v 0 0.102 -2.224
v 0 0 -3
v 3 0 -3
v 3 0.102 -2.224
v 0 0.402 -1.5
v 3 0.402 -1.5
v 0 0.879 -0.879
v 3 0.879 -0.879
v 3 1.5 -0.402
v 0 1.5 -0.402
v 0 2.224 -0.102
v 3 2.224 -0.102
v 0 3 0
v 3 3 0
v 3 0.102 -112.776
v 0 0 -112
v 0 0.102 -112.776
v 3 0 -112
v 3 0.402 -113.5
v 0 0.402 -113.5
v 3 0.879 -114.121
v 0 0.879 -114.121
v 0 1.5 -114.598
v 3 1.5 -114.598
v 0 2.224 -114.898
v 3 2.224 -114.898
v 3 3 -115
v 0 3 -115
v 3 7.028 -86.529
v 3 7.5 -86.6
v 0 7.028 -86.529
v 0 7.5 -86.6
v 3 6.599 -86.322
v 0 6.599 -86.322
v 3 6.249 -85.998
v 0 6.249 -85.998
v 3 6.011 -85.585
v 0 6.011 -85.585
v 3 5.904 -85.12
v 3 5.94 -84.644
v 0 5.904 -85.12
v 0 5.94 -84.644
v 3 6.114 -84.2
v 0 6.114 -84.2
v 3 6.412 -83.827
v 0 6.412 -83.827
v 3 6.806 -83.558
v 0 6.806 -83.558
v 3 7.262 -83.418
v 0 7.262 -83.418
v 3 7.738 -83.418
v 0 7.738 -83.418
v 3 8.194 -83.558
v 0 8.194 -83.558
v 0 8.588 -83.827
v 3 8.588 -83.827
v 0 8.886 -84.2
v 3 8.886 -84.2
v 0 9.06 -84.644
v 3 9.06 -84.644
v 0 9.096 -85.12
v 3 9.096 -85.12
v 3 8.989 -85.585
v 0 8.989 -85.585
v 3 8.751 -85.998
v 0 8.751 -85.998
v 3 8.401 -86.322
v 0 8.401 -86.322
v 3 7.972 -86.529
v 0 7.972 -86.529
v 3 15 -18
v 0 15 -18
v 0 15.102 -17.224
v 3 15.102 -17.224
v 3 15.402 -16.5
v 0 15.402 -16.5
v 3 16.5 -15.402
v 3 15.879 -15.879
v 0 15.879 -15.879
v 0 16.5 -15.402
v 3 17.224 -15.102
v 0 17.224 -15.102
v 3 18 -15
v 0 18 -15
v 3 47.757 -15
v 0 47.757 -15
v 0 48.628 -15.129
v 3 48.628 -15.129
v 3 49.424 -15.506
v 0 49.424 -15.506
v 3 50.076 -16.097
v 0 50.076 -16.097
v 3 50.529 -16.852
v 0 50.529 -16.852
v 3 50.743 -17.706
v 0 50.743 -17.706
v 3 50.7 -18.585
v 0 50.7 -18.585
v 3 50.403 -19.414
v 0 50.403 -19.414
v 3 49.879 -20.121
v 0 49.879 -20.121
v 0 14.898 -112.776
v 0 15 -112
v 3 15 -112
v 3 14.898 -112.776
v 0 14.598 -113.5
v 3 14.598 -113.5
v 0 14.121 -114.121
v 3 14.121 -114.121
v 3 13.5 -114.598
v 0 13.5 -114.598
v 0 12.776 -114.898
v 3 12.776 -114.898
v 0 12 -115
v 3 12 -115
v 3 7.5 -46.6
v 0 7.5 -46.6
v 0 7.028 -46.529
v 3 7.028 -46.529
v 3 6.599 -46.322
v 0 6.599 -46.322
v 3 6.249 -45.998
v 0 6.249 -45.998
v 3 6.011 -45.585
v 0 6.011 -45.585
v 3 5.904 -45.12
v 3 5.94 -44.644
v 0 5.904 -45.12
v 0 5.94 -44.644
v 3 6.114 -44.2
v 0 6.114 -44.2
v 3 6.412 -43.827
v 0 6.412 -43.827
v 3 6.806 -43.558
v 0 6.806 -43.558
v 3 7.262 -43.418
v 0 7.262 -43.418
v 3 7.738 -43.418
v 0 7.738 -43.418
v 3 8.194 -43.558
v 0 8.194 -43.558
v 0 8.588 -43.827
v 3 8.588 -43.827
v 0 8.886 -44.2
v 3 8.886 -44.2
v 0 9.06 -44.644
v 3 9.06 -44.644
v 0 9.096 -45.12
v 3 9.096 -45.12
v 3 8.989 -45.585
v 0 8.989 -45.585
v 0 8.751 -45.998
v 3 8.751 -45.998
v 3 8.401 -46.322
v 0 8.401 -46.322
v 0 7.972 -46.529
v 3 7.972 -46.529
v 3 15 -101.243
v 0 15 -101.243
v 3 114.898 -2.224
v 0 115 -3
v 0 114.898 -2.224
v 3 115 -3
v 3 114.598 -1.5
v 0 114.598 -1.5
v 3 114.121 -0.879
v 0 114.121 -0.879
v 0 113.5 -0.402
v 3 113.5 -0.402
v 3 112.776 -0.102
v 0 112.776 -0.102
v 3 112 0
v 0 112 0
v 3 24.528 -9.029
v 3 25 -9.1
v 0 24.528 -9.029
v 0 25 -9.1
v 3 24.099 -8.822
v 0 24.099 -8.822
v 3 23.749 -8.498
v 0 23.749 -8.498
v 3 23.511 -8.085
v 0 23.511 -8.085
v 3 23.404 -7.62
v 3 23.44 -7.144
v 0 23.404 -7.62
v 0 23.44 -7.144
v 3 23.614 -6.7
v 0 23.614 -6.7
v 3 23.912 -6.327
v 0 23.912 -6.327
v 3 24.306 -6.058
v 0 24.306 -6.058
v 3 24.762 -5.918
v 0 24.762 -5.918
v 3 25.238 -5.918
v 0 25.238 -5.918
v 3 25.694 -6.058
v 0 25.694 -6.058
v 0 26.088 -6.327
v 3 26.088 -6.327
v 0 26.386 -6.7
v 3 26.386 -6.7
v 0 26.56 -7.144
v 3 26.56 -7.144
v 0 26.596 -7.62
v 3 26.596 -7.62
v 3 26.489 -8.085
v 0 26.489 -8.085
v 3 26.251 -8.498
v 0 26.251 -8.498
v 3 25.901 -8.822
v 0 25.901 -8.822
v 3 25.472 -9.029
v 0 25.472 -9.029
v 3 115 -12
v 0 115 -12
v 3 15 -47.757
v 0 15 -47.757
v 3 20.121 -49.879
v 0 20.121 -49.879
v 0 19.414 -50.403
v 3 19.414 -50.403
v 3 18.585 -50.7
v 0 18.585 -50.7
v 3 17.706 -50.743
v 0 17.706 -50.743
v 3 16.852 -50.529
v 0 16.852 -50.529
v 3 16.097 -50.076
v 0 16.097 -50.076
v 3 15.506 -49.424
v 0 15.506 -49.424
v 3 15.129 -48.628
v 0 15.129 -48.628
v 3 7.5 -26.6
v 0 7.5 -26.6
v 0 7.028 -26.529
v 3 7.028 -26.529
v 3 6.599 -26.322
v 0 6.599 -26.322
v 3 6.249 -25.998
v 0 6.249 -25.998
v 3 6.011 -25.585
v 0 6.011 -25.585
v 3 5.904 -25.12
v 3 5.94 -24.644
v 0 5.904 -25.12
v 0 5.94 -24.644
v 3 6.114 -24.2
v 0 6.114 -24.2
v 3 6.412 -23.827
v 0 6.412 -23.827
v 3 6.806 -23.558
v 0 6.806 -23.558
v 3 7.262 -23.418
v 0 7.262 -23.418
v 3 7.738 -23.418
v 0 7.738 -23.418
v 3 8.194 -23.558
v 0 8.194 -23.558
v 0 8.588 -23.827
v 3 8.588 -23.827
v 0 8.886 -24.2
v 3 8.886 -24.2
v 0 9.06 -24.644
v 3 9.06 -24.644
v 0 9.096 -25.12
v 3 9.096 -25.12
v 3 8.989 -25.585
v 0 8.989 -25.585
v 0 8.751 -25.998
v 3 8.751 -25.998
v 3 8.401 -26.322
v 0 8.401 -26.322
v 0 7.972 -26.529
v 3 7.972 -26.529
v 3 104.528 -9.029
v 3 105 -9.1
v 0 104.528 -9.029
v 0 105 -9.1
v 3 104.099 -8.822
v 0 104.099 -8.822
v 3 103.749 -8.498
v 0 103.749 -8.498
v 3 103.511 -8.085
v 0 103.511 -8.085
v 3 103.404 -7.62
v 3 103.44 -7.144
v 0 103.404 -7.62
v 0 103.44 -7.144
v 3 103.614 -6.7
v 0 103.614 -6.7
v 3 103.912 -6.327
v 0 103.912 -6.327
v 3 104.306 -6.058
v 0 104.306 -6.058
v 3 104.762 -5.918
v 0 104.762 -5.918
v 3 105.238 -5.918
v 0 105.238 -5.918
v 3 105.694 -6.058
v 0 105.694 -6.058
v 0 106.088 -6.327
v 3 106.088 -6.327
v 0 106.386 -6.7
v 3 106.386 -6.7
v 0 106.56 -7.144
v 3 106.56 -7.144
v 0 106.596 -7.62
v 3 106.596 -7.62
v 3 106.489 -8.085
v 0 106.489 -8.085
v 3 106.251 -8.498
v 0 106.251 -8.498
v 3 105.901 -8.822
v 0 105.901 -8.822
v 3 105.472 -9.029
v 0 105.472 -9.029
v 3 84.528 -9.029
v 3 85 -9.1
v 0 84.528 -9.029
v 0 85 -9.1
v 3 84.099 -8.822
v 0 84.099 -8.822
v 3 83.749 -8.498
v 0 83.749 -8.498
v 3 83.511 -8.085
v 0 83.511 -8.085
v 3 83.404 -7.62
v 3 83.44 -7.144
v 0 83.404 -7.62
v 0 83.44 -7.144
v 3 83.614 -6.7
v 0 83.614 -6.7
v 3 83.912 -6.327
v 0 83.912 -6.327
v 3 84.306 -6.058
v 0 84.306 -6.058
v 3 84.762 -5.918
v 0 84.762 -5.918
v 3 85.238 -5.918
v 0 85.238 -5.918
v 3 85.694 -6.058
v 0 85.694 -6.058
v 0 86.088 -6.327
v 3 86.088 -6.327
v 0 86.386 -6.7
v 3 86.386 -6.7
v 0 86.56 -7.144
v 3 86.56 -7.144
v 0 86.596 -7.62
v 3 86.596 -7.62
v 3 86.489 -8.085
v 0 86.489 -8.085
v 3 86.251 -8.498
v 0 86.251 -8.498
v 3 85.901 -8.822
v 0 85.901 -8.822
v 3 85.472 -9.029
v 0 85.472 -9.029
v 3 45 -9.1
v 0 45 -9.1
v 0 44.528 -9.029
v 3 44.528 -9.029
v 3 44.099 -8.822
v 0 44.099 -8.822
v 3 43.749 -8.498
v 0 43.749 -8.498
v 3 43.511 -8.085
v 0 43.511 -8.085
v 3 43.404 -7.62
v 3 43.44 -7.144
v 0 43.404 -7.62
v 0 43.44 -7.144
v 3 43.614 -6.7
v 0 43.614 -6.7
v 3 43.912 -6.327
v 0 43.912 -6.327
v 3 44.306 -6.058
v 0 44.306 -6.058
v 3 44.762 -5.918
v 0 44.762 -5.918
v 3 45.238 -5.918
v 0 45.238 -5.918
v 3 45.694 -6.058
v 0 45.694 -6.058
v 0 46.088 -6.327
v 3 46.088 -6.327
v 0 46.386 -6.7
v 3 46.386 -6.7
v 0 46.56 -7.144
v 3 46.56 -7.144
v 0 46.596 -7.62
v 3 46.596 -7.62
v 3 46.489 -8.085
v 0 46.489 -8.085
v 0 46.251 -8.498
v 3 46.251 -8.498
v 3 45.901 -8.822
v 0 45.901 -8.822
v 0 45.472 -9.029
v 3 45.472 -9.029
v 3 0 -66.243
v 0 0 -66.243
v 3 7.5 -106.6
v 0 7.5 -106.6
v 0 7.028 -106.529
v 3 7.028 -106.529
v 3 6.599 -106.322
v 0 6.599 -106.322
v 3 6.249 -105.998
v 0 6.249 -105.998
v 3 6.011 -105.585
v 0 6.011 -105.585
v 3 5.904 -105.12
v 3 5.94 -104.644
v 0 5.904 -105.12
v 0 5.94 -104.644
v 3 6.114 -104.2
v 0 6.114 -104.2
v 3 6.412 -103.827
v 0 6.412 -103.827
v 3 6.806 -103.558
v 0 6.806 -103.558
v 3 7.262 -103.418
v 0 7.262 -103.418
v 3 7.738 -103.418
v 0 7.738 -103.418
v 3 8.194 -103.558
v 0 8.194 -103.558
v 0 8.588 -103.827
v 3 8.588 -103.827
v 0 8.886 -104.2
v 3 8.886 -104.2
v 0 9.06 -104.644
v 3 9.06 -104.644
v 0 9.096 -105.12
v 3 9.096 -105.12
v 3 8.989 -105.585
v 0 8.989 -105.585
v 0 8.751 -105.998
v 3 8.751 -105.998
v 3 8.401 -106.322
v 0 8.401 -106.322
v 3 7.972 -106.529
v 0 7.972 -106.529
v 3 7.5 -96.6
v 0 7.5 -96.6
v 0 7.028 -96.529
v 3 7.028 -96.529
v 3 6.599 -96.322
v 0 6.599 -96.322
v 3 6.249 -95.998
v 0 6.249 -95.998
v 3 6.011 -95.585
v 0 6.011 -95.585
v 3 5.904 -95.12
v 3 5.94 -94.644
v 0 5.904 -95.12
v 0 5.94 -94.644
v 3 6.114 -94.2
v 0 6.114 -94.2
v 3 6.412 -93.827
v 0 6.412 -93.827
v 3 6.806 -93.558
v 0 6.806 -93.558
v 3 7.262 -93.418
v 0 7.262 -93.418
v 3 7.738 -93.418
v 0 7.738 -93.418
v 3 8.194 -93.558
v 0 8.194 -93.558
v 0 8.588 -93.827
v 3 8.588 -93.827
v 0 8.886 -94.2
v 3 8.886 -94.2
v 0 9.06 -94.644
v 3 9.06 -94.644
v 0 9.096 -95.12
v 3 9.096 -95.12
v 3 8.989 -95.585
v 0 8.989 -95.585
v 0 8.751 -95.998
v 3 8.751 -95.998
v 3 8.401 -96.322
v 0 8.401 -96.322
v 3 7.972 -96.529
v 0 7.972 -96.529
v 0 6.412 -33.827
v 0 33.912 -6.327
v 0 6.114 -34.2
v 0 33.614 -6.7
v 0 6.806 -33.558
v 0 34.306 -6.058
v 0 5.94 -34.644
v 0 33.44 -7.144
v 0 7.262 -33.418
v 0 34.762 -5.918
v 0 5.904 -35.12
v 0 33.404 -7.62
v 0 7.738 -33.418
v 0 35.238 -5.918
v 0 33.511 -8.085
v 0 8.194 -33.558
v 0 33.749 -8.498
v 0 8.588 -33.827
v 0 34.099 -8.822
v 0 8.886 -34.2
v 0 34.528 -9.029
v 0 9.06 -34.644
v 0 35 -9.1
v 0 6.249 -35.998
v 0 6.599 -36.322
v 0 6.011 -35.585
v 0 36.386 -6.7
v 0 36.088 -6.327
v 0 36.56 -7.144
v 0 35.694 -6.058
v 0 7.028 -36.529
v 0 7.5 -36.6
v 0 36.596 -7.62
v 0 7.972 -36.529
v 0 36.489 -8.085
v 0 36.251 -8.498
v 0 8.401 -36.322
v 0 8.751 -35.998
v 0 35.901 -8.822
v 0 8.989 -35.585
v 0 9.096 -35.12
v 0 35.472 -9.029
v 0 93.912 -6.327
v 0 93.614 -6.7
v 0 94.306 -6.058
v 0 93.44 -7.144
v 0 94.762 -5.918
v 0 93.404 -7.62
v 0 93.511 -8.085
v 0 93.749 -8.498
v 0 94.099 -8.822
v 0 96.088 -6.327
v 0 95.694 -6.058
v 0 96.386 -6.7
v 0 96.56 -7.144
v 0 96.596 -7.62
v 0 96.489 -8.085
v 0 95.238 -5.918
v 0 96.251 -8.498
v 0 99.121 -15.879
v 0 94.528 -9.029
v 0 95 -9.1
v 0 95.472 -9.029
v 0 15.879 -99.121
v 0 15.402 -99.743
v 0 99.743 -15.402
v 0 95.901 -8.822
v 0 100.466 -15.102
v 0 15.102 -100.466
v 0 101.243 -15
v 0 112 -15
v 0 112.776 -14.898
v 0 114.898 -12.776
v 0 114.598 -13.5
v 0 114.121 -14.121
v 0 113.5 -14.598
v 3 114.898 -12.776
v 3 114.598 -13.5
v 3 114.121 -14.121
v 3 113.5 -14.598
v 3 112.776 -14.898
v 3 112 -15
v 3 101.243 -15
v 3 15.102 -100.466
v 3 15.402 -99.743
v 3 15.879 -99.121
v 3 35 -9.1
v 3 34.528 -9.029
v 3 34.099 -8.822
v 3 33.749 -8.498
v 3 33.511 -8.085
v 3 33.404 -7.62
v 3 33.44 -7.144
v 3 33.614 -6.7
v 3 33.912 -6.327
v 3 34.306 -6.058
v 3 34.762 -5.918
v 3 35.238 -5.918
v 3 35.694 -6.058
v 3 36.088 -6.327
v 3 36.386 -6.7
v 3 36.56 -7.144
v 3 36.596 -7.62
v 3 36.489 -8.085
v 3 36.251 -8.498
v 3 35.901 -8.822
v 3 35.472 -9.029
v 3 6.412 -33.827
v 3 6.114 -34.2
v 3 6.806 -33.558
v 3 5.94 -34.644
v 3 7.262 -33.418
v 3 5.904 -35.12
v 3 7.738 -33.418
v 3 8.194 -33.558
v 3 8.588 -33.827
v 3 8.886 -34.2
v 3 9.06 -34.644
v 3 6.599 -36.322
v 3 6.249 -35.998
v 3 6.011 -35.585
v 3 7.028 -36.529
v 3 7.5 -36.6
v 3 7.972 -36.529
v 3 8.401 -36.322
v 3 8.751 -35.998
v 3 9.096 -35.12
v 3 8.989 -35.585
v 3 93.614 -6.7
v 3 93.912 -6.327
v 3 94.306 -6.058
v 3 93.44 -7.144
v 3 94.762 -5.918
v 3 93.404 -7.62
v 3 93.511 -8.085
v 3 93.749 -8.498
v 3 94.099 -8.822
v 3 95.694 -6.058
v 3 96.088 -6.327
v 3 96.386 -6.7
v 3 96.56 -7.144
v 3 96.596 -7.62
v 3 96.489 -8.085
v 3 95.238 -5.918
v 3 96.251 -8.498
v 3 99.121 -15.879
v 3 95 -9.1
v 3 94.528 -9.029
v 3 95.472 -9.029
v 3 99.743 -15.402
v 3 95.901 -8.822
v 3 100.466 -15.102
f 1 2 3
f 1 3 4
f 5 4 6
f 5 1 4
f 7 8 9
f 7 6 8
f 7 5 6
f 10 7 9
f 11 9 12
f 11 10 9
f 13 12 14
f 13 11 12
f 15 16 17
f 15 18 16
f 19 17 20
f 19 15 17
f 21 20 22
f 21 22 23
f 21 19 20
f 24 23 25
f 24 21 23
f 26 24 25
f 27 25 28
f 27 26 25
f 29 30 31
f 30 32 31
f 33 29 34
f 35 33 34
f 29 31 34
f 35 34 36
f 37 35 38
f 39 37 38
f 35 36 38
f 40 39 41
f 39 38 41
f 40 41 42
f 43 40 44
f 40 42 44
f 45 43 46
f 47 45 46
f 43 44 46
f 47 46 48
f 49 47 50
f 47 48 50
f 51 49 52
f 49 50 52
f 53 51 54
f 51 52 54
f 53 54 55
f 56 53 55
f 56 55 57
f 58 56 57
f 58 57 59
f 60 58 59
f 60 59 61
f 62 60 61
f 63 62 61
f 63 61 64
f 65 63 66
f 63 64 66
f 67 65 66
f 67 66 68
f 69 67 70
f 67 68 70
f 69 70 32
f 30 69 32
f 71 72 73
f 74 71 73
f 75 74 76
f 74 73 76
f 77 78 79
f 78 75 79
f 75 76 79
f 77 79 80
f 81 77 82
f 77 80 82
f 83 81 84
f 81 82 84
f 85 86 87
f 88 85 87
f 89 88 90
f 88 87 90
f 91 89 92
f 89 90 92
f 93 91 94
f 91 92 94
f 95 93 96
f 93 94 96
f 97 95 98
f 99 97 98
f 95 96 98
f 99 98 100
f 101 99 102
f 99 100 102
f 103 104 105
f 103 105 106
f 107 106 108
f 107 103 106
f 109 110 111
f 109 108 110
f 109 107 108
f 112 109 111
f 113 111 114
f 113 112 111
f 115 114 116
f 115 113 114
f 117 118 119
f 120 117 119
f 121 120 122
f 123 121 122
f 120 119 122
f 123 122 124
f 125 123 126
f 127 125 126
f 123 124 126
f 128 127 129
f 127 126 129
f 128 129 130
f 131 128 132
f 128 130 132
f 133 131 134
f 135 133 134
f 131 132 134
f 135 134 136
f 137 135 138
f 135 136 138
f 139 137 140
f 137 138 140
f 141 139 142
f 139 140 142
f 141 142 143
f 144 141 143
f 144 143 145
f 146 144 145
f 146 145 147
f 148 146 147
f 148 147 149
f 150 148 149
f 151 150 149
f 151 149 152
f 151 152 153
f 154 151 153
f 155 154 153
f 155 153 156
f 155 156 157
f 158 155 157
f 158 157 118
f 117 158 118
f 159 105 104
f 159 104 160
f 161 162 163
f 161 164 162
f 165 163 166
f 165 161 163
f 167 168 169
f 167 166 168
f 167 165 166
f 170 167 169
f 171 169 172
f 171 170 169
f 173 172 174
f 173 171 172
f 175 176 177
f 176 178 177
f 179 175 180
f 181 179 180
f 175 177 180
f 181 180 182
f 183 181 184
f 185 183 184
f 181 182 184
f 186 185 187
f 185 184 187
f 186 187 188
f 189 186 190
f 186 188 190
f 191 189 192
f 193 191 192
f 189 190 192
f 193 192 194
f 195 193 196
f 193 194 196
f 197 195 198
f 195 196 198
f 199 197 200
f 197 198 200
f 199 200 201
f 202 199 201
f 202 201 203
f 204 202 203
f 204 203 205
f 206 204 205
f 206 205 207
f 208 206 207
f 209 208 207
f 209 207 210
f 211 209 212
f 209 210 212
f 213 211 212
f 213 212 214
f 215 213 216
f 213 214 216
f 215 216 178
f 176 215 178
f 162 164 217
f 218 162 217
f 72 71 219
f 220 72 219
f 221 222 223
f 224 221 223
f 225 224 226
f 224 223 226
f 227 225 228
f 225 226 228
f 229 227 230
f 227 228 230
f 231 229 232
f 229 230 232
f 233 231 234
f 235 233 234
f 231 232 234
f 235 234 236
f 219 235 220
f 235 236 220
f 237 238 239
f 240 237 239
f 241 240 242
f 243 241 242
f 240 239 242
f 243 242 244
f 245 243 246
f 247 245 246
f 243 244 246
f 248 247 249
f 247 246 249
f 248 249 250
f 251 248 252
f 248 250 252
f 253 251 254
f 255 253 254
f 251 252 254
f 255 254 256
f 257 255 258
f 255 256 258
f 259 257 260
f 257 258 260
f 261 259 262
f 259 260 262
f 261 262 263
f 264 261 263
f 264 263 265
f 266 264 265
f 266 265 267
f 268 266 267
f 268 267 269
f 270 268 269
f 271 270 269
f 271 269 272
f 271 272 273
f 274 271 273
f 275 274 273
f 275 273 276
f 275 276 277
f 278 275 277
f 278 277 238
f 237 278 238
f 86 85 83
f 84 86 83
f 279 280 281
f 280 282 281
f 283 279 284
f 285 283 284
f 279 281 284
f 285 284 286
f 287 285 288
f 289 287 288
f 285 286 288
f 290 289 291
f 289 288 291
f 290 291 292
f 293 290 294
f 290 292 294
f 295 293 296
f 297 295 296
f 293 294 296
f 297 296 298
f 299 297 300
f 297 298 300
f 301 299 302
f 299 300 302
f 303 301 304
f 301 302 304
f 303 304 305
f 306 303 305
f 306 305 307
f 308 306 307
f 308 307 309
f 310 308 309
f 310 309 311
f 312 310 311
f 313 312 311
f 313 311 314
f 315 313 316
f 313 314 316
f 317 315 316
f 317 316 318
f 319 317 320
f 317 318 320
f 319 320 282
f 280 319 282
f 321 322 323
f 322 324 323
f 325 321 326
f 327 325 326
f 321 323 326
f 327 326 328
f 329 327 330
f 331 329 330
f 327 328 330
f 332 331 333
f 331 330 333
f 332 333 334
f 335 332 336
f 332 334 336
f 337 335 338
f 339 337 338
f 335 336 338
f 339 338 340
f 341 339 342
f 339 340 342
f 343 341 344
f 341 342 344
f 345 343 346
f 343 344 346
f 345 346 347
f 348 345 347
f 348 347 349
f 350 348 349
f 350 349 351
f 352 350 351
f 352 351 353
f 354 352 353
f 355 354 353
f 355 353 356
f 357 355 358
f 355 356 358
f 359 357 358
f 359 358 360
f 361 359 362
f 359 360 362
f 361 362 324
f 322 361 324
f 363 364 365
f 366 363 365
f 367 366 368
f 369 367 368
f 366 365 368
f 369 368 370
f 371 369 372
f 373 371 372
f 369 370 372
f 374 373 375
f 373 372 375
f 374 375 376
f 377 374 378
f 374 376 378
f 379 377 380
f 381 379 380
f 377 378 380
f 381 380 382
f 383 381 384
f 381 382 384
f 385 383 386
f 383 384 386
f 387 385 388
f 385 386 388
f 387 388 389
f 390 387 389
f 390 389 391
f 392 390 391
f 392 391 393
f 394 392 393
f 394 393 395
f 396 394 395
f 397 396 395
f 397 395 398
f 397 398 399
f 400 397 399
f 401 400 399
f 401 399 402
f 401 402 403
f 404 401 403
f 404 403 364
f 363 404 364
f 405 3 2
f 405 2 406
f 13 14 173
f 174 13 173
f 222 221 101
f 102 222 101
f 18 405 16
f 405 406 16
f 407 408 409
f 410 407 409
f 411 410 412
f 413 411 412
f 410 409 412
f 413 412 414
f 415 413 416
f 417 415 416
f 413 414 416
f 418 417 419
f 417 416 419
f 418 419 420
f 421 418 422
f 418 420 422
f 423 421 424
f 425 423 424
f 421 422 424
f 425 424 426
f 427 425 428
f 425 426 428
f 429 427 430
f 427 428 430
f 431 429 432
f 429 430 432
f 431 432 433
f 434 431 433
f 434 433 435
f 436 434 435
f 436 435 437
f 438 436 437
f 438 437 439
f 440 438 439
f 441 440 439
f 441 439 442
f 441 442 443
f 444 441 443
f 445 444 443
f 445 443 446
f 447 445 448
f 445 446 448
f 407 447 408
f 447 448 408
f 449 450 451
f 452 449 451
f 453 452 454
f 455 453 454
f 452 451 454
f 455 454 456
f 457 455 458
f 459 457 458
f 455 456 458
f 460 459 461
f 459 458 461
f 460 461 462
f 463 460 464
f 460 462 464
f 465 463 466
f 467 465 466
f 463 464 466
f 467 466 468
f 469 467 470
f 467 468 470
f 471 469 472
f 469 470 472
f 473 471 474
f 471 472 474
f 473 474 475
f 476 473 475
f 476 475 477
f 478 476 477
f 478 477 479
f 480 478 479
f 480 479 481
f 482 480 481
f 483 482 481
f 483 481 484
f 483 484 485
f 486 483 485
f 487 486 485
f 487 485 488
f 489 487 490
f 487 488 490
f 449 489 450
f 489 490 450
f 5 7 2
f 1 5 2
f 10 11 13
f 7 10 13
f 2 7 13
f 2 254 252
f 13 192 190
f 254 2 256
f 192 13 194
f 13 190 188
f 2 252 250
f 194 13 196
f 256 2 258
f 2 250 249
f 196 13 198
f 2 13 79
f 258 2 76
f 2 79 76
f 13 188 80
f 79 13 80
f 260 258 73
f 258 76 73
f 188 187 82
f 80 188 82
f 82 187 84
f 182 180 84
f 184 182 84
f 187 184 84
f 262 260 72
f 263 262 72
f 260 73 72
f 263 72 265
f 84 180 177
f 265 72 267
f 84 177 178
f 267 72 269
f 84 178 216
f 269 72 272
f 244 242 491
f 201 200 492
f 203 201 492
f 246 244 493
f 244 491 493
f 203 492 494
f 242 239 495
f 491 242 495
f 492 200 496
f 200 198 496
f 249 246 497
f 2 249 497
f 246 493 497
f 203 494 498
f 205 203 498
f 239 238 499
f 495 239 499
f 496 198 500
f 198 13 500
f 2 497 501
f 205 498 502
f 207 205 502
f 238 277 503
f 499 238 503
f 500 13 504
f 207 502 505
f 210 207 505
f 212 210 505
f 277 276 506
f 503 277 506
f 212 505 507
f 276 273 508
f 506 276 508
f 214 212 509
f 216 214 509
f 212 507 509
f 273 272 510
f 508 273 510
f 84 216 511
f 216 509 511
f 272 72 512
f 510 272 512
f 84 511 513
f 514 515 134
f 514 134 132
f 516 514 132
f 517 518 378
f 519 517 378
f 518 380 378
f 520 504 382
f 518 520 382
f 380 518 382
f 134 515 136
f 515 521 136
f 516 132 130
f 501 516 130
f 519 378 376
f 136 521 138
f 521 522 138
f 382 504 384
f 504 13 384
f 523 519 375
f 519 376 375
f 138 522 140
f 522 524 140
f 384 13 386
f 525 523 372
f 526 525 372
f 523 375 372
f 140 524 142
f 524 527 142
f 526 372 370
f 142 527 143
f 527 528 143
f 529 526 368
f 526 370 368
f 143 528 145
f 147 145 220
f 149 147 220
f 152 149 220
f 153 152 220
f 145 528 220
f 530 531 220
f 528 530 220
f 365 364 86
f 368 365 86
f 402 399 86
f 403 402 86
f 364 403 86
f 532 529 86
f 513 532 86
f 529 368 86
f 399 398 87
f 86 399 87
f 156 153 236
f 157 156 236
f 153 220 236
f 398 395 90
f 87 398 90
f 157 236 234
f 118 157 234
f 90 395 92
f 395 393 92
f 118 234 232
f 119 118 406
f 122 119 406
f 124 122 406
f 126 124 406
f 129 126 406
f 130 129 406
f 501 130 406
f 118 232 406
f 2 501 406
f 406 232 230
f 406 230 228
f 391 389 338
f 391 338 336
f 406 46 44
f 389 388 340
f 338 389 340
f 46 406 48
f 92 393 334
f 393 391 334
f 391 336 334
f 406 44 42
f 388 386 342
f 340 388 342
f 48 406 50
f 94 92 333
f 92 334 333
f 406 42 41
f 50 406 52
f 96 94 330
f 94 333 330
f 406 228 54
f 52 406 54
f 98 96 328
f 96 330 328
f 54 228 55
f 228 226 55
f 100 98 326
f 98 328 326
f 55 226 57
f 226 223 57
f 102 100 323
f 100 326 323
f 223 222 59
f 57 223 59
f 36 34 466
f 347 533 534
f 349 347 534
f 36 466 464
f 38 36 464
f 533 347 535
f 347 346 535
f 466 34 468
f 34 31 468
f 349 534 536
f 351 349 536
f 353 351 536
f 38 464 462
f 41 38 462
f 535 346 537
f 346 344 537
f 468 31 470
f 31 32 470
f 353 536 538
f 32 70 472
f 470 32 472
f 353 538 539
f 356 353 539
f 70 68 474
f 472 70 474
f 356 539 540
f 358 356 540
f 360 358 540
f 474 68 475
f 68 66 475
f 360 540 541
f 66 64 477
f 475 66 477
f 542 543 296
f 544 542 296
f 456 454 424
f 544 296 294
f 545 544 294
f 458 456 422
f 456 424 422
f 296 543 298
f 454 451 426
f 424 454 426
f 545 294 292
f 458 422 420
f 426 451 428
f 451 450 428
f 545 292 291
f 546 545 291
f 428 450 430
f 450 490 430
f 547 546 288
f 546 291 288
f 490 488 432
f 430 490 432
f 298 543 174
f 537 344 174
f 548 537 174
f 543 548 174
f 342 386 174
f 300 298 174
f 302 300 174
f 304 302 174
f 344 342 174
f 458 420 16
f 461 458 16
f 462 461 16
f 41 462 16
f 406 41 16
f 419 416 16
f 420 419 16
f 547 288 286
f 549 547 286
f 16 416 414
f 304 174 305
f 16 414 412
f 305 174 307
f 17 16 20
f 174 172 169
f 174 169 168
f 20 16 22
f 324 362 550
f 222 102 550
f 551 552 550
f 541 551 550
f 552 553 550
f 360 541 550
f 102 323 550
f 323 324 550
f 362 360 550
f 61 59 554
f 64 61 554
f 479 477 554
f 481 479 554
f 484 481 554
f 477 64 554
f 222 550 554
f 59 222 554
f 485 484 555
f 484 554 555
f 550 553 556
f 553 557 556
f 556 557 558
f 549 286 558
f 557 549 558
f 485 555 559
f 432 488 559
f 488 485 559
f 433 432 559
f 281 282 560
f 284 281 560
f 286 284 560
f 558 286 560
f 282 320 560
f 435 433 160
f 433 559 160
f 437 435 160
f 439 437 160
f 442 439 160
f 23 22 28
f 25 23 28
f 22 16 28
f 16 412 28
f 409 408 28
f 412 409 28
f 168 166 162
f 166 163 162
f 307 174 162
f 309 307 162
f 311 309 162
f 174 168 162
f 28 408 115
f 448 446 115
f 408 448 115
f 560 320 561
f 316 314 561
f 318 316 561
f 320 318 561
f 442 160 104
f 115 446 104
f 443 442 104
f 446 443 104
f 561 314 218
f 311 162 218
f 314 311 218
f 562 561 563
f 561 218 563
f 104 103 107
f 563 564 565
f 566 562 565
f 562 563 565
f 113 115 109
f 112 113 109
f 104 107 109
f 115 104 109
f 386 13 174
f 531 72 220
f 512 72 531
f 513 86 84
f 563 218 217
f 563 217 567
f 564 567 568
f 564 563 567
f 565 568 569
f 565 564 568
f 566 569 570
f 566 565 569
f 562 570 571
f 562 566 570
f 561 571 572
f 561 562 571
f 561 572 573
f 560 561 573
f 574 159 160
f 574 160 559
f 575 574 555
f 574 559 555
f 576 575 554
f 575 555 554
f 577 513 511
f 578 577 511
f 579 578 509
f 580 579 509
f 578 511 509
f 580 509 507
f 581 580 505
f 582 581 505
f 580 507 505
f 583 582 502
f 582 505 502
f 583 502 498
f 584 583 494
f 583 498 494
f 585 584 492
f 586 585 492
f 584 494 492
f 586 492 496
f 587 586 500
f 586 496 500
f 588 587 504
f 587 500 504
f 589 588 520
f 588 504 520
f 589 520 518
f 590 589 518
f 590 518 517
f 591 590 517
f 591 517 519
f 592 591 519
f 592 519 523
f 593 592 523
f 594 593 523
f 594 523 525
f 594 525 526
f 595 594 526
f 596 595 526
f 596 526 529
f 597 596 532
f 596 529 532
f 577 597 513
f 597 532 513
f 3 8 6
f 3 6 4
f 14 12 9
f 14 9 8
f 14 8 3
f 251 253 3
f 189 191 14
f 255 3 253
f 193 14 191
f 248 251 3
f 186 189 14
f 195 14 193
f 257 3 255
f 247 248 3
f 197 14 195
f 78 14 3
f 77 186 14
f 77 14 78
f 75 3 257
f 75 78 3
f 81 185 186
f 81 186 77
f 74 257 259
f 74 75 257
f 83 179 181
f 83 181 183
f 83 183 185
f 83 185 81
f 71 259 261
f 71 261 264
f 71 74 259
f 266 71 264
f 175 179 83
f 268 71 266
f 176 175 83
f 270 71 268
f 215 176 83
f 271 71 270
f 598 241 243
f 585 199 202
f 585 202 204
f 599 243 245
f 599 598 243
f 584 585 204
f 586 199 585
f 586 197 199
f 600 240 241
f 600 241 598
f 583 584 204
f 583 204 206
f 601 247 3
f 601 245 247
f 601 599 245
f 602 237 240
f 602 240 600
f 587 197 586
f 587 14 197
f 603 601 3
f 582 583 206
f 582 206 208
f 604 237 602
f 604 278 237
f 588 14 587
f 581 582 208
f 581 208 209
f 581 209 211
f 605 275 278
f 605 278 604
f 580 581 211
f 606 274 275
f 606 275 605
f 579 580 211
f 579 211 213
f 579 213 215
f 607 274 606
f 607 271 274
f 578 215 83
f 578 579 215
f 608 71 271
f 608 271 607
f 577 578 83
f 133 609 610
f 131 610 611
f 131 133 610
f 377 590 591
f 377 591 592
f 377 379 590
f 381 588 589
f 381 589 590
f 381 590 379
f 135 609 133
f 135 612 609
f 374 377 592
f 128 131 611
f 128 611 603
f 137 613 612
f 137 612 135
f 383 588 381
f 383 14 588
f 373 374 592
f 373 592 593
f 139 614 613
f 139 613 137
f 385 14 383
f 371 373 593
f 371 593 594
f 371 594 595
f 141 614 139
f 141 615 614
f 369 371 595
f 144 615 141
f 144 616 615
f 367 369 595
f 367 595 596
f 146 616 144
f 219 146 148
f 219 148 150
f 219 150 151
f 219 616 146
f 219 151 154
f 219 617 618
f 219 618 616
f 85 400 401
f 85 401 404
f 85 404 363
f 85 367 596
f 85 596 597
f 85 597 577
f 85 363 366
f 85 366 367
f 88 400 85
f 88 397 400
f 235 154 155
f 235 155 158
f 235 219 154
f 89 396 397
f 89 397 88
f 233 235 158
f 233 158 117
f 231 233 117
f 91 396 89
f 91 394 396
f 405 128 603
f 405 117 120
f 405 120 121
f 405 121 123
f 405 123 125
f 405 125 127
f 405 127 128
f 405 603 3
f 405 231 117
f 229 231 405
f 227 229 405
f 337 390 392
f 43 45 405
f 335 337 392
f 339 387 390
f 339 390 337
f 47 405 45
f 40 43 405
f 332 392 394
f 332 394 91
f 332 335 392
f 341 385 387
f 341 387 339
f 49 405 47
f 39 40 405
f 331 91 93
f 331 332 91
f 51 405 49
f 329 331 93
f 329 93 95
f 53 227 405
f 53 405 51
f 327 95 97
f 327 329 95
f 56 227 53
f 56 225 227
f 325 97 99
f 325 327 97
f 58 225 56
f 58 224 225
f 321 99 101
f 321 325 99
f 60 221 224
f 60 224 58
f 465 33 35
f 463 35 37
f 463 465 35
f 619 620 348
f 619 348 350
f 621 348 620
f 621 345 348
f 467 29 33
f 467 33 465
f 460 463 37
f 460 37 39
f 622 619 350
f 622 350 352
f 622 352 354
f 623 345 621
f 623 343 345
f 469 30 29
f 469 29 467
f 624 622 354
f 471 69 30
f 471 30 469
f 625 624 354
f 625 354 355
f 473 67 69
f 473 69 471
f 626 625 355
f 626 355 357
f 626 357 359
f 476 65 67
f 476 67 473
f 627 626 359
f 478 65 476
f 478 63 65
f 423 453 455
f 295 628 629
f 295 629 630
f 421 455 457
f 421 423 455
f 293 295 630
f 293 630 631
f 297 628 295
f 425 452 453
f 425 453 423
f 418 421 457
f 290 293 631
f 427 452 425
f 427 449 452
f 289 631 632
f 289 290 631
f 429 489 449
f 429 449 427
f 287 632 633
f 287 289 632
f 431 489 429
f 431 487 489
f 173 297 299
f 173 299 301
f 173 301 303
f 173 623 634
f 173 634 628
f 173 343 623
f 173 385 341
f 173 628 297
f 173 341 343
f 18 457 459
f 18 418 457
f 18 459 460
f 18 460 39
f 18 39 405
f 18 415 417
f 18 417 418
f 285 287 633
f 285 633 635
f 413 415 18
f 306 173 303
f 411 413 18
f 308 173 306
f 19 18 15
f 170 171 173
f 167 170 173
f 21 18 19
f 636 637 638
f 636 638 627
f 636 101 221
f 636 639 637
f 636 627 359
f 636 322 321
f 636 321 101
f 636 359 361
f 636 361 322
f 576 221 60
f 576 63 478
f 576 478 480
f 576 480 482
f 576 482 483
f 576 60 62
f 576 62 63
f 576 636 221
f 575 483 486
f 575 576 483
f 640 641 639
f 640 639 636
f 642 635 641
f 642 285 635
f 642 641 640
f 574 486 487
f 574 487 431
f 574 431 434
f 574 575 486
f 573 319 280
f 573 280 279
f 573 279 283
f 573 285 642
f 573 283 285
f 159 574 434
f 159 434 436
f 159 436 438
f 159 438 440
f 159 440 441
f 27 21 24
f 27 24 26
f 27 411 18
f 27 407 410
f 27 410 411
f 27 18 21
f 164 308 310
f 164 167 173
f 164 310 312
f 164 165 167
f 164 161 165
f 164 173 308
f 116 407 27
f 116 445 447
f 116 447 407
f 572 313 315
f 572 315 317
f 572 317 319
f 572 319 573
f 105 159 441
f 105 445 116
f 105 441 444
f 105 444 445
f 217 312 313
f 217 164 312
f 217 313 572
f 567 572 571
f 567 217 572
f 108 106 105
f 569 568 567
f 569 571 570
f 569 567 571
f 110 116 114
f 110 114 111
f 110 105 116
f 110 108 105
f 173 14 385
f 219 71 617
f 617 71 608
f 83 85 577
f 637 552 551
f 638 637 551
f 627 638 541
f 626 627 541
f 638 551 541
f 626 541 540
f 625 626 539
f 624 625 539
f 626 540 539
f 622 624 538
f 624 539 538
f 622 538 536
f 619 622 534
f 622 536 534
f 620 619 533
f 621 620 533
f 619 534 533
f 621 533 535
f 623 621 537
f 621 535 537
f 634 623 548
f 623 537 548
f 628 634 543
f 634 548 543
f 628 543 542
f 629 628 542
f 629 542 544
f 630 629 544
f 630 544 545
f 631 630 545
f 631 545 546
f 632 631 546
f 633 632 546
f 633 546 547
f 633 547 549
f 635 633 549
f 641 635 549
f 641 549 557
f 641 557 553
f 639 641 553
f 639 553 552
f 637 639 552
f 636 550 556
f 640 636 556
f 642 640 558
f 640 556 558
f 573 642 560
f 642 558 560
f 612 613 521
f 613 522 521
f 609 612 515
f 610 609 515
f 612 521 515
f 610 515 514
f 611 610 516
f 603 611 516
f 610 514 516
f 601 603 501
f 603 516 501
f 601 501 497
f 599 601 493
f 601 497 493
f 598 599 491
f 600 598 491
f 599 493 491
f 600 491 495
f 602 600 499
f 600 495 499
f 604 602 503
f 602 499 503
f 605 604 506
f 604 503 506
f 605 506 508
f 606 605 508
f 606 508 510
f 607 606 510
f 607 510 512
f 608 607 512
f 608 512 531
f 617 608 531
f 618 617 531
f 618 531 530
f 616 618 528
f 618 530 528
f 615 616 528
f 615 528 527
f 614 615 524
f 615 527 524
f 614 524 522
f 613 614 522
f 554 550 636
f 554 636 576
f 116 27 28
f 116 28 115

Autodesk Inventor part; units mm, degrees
ref_plane "YZ Plane" through (0, 0, 0) normal (1, 0, 0) x (0, 1, 0)
ref_plane "XZ Plane" through (0, 0, 0) normal (0, 1, 0) x (-1, 0, 0)
ref_plane "XY Plane" through (0, 0, 0) normal (0, 0, 1) x (1, 0, 0)
sketch "スケッチ1" plane through (0, 0, 0) normal (1, 0, 0) x (0, 1, 0)
  line L0 (0, 0) -> (0, -115)
  line L1 (0, 0) -> (115, 0) construction
  line L2 (0, 0) -> (115, 0)
  line L3 (0, 0) -> (115, 0) construction
  line L4 (115, 0) -> (0, -115)
  dimension "d0" = 115
  dimension "d1" = 90
  dimension "d2" = 115
  dimension "d3" = 0
extrude "押し出し1" add sketch "スケッチ1" along normal blind 3
sketch "スケッチ2" plane through (3, 0, 0) normal (1, 0, 0) x (0, 0, -1)
  line L0 (0, 0) -> (0, 65)
  line L1 (0, 115) -> (0, 0) projected
  line L2 (0, 0) -> (65, 0) construction
  line L3 (0, 0) -> (65, 0)
  line L4 (0, 0) -> (115, 0) projected
  line L5 (0, 0) -> (65, 0) construction
  line L6 (65, 0) -> (0, 65)
  dimension "d6" = 65
  dimension "d7" = 90
  dimension "d8" = 65
  dimension "d9" = 0
extrude "押し出し2" cut sketch "スケッチ2" against normal blind 3
sketch "スケッチ3" plane through (3, 0, 0) normal (1, 0, 0) x (0, 0, -1)
  line L0 (0, 115) -> (15, 115)
  line L1 (0, 115) -> (15, 115) construction
  line L2 (15, 115) -> (15, 100)
  line L3 (115, 0) -> (0, 115) projected
  line L4 (115, 0) -> (115, 15)
  line L5 (115, 0) -> (130, 0) construction
  line L6 (115, 15) -> (100, 15)
  point P0 (0, 0)
  dimension "d12" = 15
  dimension "d13" = 0
  dimension "d14" = 15
  dimension "d15" = 90
extrude "押し出し3" add sketch "スケッチ3" against normal blind 3
sketch "スケッチ4" plane through (3, 0, 0) normal (1, 0, 0) x (0, 0, -1)
  line L0 (15, 115) -> (0, 115) projected
  line L1 (15, 100) -> (15, 115) projected
  line L2 (0, 115) -> (0, 65) projected
  line L3 (0, 0) -> (95, 95) construction
  line L4 (0, 0) -> (134.3503, 0) construction
  point P0 (7.5, 105)
  point P1 (7.5, 95)
  point P2 (7.5, 85)
  point P3 (105, 7.5)
  point P4 (95, 7.5)
  point P5 (85, 7.5)
  dimension "d18" = 10
  dimension "d19" = 7.5
  dimension "d20" = 7.5
  dimension "d21" = 7.5
  dimension "d22" = 10
  dimension "d23" = 10
  dimension "d24" = 45
hole "穴1" at (3, 105, -7.5) at (3, 95, -7.5) at (3, 85, -7.5) at (3, 7.5, -105) at (3, 7.5, -95) at (3, 7.5, -85) direction (-1, 0, 0) diameter 3.2 end through all
fillet "フィレット1" radius 3 8 edges at (1.5, 115, -15) (1.5, 100, -15) (1.5, 15, -100) (1.5, 15, -115) (1.5, 0, -115) (1.5, 0, -65) (1.5, 65, 0) (1.5, 115, 0)
sketch "スケッチ5" plane through (3, 0, 0) normal (1, 0, 0) x (0, 0, -1)
  line L0 (0, 0) -> (65, 0)
  line L1 (66.2426, 0) -> (112, 0) projected
  line L2 (0, 0) -> (66.2426, 0)
  arc A0 (0, 66.2426) -> (0.8787, 64.1213) centre (3, 66.2426) ccw projected
  line L3 (0, 0) -> (0, 66.2426)
  line L4 (0.8787, 64.1213) -> (64.1213, 0.8787) projected
  line L5 (0.8787, 64.1213) -> (64.1213, 0.8787)
  arc A1 (0, 66.2426) -> (0.8787, 64.1213) centre (3, 66.2426) ccw
  arc A2 (64.1213, 0.8787) -> (66.2426, 0) centre (66.2426, 3) ccw
extrude "押し出し4" add sketch "スケッチ5" against normal blind 3
sketch "スケッチ6" plane through (3, 0, 0) normal (1, 0, 0) x (0, 0, -1)
  line L0 (0, 0) -> (112, 0) projected
  line L1 (0, 112) -> (0, 0) projected
  line L2 (15, 15) -> (55, 15)
  line L3 (55, 15) -> (15, 55)
  line L4 (15, 55) -> (15, 15)
  dimension "d35" = 15
  dimension "d36" = 15
  dimension "d37" = 40
  dimension "d38" = 40
extrude "押し出し5" cut sketch "スケッチ6" against normal blind 3
sketch "スケッチ7" plane through (3, 0, 0) normal (1, 0, 0) x (0, 0, -1)
  line L0 (0, 112) -> (0, 0) projected
  line L1 (0, 0) -> (112, 0) projected
  line L2 (0, 0) -> (0, 112) projected
  line L3 (0, 0) -> (76.3955, 76.3955) construction
  line L4 (0, 0) -> (108.0395, 0) construction
  point P0 (7.5, 25)
  point P1 (7.5, 35)
  point P2 (7.5, 45)
  point P3 (25, 7.5)
  point P4 (35, 7.5)
  point P5 (45, 7.5)
  dimension "d41" = 7.5
  dimension "d42" = 25
  dimension "d43" = 10
  dimension "d44" = 10
  dimension "d46" = 45
hole "穴2" at (3, 25, -7.5) at (3, 35, -7.5) at (3, 45, -7.5) at (3, 7.5, -25) at (3, 7.5, -35) at (3, 7.5, -45) direction (-1, 0, 0) diameter 3.2 end through all
fillet "フィレット2" radius 3 4 edges at (1.5, 15, -55) (1.5, 55, -15) (1.5, 15, -15) (1.5, 0, 0)
properties part number "射出_固定2" material "アルミニウム 6061"
